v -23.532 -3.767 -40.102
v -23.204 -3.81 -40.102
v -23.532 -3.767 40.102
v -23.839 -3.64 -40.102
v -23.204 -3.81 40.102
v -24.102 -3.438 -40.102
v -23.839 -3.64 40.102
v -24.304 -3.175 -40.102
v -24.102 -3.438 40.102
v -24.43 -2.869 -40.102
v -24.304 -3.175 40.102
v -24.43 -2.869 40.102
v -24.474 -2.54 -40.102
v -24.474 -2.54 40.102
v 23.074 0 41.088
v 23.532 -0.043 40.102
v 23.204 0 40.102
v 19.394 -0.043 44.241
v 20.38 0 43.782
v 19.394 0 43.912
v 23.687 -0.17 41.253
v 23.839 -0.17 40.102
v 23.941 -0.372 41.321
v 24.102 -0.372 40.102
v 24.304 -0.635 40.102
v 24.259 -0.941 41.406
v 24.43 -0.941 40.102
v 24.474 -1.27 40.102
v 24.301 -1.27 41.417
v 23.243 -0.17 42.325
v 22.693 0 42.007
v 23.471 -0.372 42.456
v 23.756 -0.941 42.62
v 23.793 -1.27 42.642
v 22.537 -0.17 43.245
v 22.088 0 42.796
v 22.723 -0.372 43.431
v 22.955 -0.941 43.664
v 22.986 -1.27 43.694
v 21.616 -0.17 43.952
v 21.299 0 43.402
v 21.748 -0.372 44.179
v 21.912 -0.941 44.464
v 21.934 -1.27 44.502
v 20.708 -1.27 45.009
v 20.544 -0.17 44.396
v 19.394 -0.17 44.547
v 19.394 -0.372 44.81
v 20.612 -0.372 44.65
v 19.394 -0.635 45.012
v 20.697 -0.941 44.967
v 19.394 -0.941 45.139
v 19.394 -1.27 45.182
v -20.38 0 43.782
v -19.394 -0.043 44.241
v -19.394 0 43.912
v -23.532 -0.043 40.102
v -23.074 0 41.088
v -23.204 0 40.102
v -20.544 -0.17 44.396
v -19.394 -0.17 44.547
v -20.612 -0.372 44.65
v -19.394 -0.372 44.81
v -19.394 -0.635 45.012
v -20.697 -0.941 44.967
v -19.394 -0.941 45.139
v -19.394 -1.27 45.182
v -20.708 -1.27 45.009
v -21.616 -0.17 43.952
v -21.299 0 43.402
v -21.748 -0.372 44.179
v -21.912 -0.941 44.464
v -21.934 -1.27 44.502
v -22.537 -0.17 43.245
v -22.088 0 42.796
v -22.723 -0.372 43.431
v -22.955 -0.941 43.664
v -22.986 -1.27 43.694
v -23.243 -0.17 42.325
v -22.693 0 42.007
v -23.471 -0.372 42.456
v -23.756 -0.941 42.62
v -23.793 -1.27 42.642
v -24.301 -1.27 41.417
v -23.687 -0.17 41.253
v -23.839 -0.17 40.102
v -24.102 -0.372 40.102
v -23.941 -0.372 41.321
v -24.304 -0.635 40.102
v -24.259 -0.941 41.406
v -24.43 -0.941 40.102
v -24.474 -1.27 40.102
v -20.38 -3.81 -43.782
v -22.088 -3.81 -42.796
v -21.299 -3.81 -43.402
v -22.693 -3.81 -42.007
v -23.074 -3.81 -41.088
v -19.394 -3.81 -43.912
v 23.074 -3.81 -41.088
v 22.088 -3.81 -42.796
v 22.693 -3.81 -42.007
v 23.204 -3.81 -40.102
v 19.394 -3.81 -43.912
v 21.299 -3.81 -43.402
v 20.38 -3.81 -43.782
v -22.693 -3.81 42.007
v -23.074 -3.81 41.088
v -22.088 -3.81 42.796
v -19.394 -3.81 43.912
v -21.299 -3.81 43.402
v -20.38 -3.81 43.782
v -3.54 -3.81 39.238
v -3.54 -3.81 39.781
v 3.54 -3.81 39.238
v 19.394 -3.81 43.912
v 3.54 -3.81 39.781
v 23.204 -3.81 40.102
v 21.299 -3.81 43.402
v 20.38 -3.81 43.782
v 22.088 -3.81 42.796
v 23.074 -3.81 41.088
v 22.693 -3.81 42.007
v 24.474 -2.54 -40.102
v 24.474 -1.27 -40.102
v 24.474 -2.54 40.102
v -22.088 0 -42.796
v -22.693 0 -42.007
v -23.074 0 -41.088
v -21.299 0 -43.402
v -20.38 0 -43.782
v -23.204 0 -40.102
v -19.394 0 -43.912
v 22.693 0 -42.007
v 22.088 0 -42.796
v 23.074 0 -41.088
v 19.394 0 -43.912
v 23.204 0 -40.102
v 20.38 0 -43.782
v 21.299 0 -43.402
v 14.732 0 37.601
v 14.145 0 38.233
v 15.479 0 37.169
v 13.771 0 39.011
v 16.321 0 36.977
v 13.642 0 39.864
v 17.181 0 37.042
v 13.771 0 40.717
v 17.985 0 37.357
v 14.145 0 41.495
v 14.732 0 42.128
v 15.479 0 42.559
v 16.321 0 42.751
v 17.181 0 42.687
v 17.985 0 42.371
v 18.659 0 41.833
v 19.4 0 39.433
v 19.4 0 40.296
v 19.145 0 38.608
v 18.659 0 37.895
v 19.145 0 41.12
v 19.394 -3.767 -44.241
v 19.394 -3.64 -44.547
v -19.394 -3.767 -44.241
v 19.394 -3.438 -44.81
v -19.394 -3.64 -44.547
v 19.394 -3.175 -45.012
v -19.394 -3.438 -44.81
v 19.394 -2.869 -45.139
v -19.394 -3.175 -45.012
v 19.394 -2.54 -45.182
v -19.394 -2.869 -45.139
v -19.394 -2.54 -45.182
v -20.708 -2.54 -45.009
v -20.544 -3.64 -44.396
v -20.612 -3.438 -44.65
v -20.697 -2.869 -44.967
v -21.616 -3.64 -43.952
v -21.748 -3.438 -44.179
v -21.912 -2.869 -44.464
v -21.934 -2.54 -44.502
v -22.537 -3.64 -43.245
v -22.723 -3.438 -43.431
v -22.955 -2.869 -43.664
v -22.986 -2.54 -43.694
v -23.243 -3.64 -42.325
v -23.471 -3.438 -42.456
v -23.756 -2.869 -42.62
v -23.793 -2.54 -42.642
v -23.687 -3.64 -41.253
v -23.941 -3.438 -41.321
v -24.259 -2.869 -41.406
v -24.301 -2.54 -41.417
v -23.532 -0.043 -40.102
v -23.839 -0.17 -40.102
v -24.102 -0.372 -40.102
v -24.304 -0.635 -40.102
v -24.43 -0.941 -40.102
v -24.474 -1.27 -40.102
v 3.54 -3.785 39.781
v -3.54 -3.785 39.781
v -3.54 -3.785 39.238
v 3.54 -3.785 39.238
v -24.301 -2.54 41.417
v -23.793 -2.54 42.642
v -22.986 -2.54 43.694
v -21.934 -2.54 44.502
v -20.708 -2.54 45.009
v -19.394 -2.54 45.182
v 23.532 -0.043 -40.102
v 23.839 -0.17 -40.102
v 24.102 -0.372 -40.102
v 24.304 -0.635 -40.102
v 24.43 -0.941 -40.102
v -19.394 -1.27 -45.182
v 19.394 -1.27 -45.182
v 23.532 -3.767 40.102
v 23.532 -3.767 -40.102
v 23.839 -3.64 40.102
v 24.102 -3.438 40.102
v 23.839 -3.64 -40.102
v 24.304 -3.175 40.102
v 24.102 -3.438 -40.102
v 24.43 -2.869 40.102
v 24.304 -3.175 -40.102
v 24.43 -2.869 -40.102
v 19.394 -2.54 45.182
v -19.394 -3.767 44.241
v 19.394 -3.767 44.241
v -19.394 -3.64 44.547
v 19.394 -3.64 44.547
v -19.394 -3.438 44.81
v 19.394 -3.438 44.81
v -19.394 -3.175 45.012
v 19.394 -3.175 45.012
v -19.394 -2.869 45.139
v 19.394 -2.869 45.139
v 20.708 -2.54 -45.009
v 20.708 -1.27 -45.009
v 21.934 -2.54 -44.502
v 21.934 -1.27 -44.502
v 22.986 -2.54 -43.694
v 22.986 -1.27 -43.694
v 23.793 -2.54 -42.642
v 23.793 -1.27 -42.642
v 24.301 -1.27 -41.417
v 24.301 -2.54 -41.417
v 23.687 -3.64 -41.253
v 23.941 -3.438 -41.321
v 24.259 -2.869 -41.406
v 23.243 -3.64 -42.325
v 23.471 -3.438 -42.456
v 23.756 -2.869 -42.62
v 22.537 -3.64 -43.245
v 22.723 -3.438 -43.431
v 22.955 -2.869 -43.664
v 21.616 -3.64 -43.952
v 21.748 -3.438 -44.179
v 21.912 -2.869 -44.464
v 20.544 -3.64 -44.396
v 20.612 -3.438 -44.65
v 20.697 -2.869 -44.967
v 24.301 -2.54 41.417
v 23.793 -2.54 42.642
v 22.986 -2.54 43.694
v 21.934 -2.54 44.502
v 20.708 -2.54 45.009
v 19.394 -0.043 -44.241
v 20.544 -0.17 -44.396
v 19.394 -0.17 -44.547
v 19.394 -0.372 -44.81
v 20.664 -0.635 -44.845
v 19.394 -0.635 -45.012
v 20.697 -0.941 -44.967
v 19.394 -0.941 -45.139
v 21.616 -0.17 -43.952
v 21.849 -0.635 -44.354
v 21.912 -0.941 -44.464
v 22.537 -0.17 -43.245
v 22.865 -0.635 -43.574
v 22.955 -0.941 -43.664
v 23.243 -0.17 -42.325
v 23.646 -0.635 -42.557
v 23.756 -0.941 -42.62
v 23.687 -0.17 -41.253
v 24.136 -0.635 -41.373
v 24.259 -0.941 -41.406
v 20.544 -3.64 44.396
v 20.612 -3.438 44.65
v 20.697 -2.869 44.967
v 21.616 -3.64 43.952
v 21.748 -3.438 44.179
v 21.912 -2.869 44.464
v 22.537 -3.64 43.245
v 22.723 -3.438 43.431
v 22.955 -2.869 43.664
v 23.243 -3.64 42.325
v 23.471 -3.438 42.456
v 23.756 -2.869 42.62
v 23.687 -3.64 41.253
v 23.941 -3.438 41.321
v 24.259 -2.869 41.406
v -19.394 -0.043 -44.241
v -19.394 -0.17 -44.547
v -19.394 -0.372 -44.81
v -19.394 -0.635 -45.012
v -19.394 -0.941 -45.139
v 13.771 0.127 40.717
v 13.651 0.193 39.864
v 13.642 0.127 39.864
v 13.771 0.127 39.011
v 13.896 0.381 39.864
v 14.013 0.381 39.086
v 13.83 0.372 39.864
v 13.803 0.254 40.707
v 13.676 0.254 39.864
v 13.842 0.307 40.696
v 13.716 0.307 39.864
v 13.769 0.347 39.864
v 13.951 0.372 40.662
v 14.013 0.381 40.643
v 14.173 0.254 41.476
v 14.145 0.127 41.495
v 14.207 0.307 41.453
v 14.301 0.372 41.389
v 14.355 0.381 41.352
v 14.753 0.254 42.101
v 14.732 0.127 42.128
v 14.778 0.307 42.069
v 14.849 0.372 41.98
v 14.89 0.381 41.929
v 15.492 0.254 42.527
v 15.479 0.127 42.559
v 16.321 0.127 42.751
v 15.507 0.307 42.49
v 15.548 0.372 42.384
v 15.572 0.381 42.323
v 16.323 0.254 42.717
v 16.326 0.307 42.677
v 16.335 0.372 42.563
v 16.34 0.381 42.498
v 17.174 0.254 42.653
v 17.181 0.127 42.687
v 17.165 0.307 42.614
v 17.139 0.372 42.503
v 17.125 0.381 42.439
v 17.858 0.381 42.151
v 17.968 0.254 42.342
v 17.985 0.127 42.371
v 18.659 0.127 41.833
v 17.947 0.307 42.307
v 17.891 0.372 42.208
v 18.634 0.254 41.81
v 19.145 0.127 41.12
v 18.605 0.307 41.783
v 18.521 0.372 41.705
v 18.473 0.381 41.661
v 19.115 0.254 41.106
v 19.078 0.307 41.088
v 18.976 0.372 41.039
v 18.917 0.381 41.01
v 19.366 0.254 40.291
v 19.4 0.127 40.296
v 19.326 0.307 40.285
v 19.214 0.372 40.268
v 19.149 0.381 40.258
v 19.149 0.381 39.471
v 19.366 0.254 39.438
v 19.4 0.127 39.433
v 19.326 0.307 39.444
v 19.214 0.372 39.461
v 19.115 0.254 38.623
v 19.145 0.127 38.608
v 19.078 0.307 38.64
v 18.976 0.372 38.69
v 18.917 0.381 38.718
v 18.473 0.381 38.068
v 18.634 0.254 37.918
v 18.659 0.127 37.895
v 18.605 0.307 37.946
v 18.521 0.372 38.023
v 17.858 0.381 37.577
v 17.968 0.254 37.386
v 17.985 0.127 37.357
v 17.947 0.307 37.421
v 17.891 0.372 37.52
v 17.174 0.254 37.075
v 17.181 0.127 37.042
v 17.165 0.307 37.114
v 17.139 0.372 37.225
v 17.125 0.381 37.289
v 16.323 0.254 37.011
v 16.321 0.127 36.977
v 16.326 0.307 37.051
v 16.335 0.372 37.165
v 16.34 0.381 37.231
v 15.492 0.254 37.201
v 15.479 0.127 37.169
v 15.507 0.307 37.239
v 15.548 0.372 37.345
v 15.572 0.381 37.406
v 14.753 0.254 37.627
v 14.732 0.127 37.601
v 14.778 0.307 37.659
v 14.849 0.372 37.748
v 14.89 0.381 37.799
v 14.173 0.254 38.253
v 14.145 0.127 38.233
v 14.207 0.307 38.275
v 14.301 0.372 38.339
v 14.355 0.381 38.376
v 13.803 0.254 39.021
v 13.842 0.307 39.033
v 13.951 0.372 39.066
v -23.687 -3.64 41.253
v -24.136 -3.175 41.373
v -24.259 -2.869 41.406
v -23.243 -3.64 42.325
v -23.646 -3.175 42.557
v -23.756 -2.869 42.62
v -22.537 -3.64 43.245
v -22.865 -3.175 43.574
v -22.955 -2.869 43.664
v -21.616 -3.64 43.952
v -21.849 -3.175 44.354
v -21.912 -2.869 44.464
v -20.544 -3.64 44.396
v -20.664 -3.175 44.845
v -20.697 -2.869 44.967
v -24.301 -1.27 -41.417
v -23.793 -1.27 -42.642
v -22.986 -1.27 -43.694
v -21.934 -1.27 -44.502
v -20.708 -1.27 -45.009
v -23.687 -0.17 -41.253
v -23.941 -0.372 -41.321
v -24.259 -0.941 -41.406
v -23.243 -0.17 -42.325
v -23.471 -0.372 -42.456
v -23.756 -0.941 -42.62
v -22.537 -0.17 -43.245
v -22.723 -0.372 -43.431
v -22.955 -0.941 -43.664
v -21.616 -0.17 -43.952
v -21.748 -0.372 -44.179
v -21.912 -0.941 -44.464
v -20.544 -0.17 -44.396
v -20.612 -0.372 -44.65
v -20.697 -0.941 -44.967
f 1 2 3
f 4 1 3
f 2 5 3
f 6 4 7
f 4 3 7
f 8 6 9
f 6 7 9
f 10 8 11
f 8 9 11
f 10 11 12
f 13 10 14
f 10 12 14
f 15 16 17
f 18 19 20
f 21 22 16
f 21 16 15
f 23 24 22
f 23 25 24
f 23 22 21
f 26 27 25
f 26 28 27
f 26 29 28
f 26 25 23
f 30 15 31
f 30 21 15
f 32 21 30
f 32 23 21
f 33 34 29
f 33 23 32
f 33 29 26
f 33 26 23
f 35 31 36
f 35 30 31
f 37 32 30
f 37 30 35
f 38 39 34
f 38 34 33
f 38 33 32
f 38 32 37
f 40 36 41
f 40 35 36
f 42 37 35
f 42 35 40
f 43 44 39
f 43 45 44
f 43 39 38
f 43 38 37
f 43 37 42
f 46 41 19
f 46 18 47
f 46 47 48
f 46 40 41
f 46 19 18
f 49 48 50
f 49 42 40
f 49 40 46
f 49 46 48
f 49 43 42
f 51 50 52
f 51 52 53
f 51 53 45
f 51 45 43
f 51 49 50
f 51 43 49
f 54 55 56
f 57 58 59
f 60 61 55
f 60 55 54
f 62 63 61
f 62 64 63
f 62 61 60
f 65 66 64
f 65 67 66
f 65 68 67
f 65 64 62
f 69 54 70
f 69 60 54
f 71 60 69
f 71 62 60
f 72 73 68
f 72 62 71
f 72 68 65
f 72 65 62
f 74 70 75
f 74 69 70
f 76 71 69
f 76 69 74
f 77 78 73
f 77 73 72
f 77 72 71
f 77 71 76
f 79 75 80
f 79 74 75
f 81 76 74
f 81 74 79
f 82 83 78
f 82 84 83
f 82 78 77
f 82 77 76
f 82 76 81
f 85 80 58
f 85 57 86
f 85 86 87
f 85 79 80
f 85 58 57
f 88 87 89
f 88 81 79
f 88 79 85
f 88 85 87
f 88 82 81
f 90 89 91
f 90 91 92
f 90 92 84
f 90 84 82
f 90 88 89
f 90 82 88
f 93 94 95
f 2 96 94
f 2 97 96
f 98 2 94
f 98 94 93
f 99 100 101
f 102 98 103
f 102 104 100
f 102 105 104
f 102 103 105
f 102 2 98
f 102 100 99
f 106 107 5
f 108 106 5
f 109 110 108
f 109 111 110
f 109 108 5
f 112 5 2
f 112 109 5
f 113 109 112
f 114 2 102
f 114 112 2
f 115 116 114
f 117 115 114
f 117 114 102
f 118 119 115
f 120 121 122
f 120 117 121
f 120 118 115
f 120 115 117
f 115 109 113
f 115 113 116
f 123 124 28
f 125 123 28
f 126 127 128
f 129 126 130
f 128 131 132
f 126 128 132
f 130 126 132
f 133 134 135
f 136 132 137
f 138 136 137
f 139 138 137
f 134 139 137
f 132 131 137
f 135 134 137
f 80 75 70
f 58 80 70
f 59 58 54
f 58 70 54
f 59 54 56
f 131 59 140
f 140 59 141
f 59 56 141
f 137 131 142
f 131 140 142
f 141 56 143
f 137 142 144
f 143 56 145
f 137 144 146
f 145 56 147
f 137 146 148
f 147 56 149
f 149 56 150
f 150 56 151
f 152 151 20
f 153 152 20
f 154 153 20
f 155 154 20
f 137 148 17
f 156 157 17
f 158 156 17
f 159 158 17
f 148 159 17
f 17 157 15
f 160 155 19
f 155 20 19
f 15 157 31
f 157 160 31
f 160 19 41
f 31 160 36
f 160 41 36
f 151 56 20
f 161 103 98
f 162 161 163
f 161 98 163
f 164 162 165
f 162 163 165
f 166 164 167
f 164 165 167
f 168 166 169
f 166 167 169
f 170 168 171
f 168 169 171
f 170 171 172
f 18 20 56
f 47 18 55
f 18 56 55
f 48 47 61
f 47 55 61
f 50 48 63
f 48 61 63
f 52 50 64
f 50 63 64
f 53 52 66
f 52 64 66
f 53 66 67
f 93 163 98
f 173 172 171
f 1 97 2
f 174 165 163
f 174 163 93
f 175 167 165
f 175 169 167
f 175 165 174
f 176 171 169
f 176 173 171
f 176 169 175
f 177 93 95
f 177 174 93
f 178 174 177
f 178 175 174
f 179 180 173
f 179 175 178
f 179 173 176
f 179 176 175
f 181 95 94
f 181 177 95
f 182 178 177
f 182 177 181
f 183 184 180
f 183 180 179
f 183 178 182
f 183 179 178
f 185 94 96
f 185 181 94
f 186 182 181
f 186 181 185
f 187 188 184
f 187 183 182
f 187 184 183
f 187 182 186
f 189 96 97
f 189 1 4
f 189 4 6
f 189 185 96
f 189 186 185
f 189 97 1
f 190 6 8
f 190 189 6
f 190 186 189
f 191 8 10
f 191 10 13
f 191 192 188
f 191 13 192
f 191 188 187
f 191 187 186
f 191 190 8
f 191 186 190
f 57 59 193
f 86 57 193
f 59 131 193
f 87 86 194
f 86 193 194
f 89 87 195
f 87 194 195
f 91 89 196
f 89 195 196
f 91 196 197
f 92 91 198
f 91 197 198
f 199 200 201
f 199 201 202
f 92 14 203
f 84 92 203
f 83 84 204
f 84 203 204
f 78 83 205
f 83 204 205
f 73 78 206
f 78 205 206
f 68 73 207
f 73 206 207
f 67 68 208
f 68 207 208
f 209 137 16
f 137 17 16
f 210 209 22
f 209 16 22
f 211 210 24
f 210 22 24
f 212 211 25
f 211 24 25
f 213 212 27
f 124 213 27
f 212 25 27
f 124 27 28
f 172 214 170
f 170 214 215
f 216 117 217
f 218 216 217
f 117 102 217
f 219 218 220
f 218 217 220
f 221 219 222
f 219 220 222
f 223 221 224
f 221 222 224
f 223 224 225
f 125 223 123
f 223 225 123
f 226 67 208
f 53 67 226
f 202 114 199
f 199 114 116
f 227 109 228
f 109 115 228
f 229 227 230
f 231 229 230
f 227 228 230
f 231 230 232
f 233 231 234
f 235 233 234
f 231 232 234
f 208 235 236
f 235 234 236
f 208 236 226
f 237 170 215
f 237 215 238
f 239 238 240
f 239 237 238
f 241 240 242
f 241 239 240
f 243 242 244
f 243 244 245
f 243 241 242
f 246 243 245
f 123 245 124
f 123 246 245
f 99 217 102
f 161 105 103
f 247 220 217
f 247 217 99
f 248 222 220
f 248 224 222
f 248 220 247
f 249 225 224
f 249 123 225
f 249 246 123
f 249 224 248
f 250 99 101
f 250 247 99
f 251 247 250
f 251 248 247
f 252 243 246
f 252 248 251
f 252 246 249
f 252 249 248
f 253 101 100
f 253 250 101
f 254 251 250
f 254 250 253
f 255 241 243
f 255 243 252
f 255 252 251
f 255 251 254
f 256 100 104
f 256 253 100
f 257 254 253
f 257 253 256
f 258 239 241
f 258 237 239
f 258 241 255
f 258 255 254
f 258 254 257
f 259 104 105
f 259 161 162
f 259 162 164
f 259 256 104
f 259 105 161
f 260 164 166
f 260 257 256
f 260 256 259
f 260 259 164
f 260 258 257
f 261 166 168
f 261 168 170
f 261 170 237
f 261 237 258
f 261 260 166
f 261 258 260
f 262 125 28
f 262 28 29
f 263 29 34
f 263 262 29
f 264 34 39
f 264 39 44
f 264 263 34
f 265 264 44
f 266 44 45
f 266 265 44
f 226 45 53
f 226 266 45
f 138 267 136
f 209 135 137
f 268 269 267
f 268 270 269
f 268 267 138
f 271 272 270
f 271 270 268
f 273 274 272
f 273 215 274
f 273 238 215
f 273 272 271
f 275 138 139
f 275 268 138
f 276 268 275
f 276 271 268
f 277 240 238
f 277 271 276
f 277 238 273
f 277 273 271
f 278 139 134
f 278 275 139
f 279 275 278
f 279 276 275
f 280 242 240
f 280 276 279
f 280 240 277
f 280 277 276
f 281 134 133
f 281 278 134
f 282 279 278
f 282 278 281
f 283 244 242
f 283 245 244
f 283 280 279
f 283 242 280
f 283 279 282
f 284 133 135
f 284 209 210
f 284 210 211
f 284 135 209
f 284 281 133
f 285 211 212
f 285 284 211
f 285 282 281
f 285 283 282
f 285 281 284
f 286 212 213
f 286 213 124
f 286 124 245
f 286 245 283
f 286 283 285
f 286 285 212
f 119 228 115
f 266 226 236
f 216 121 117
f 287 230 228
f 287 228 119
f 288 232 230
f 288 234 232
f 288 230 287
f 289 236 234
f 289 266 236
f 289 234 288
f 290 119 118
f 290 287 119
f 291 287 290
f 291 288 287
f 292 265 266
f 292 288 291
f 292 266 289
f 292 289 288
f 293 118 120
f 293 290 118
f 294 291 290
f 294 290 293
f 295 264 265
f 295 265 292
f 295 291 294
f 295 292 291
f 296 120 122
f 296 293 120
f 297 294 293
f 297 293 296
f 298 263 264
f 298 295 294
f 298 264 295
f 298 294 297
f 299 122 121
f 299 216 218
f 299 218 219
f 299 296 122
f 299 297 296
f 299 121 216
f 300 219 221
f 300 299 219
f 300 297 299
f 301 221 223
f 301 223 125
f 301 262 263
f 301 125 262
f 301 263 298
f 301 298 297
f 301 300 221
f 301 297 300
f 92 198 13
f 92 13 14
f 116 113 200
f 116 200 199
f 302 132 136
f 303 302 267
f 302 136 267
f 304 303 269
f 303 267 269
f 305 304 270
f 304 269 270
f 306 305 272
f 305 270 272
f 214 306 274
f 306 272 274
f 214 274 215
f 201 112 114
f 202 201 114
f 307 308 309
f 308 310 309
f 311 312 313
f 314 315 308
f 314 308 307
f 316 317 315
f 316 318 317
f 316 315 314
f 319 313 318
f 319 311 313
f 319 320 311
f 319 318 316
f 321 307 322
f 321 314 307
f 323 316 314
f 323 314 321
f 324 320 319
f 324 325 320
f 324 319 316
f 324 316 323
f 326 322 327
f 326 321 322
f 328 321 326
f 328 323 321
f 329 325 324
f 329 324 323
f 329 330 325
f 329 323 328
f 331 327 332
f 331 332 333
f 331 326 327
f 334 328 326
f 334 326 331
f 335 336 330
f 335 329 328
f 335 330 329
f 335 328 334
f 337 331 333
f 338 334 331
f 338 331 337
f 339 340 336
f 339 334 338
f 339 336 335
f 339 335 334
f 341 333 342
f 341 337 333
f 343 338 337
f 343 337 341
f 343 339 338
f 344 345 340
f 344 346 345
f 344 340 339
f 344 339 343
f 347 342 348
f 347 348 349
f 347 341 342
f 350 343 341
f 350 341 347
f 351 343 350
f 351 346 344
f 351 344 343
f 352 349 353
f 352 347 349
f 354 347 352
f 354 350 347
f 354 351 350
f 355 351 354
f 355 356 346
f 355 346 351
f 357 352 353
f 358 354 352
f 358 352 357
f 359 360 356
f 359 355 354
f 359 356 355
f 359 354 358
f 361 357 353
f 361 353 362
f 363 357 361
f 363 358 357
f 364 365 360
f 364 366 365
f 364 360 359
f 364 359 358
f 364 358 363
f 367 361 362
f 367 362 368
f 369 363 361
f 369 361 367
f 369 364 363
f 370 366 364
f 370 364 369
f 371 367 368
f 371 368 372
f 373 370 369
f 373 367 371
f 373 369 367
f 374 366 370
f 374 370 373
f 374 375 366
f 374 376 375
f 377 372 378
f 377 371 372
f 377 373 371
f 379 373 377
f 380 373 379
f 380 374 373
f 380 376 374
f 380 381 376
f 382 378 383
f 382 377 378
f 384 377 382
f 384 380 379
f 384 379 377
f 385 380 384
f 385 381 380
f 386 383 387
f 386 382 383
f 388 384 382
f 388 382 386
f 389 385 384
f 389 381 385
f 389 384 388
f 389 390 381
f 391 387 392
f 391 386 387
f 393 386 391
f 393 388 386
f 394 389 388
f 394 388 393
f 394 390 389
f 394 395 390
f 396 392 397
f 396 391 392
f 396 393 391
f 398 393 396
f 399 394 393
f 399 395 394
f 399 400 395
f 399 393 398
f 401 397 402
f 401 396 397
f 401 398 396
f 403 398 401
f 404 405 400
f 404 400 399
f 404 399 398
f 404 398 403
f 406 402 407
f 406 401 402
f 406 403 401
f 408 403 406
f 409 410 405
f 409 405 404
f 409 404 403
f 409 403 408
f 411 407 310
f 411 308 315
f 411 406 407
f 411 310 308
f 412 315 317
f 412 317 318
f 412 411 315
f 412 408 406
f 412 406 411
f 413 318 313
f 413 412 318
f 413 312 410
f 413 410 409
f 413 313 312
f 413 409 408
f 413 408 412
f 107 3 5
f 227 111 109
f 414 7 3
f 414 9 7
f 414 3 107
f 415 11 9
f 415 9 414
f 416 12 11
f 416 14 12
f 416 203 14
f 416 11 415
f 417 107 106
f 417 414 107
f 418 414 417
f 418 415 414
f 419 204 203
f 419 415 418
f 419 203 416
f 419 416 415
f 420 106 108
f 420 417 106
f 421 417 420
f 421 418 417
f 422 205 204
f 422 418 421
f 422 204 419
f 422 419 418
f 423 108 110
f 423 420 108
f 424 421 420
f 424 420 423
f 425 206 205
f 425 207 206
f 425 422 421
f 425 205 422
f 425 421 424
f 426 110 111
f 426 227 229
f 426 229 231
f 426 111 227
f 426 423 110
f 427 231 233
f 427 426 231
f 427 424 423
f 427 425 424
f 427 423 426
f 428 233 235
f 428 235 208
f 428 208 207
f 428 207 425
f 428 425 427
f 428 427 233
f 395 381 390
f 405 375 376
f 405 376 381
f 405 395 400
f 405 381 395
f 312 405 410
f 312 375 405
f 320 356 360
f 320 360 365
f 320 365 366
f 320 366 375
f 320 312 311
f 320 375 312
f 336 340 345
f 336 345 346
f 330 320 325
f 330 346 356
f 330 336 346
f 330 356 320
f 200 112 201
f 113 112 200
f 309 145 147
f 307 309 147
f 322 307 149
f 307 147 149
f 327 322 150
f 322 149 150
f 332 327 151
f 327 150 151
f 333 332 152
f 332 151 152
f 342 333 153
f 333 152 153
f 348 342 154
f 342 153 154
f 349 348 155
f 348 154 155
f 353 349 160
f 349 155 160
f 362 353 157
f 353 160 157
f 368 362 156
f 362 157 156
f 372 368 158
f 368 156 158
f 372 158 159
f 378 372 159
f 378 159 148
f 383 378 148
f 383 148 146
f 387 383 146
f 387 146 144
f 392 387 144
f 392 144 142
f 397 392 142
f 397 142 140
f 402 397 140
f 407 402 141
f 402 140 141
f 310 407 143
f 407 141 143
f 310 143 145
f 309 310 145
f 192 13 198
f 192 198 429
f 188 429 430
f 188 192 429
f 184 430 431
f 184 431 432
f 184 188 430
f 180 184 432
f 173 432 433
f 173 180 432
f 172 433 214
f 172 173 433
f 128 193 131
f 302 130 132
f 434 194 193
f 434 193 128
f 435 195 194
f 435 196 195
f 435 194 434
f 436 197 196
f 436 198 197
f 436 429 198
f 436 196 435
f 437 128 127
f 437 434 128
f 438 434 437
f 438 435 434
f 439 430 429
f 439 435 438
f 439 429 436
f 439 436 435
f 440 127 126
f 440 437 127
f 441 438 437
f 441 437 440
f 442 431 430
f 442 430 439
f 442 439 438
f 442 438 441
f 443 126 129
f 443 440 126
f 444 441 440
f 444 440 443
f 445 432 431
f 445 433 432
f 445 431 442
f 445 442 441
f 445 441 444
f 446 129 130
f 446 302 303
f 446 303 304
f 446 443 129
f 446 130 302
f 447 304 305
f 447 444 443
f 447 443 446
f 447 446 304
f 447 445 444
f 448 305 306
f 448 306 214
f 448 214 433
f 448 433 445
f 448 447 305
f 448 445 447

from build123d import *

# Parameters (mm, degrees)
F0_W      = 48.9472970366
F0_H      = 90.3642401099
F1_DEPTH  = 3.81
F2_R      = 5.08
F3_R      = 1.27
F4_R      = 1.27
F7_W      = 7.0798662491
F7_H      = 0.5429834127
F8_DEPTH  = 0.0254
F10_R     = 2.8950348496
F11_DEPTH = 0.381
F12_R     = 0.254


# Not quite as in the source:
# - the program builds the solid bodies; features that only make, move or delete a surface that nothing else refers to are left out


with BuildPart() as f1:
    # F0 (on Front) → F1 (new body)
    with BuildSketch(Plane.XZ):
        Rectangle(F0_W, F0_H)
    extrude(amount=F1_DEPTH)

    # F2
    f2_edges = [f1.edges().sort_by_distance(p)[0] for p in [
        (-24.473649, -1.905, 45.18212),
        (24.473649, -1.905, 45.18212),
        (24.473649, -1.905, -45.18212),
        (-24.473649, -1.905, -45.18212),
    ]]
    fillet(f2_edges, radius=F2_R)

    # F3
    f3_edges = [f1.edges().sort_by_distance(p)[0] for p in [
        (24.473649, 0, 0),
    ]]
    fillet(f3_edges, radius=F3_R)

    # F4
    f4_edges = [f1.edges().sort_by_distance(p)[0] for p in [
        (0, -3.81, 45.18212),
    ]]
    fillet(f4_edges, radius=F4_R)

    # F7 (on face) → F8 (cut)
    with BuildSketch(Plane.XZ.offset(3.81)):
        with Locations((0, 39.5097658038)):
            Rectangle(F7_W, F7_H)
    extrude(amount=-F8_DEPTH, mode=Mode.SUBTRACT)

    # F10 (on face) → F11 (join)
    with BuildSketch(Plane(origin=(0, 0, 0), x_dir=(-1, 0, 0), z_dir=(0, 1, 0))):
        with Locations((-16.5371242911, 39.8641712964)):
            Circle(F10_R)
    extrude(amount=F11_DEPTH)

    # F12
    f12_edges = [f1.edges().sort_by_distance(p)[0] for p in [
        (19.432159, 0.381, 39.864171),
    ]]
    fillet(f12_edges, radius=F12_R)


solid = f1.part
